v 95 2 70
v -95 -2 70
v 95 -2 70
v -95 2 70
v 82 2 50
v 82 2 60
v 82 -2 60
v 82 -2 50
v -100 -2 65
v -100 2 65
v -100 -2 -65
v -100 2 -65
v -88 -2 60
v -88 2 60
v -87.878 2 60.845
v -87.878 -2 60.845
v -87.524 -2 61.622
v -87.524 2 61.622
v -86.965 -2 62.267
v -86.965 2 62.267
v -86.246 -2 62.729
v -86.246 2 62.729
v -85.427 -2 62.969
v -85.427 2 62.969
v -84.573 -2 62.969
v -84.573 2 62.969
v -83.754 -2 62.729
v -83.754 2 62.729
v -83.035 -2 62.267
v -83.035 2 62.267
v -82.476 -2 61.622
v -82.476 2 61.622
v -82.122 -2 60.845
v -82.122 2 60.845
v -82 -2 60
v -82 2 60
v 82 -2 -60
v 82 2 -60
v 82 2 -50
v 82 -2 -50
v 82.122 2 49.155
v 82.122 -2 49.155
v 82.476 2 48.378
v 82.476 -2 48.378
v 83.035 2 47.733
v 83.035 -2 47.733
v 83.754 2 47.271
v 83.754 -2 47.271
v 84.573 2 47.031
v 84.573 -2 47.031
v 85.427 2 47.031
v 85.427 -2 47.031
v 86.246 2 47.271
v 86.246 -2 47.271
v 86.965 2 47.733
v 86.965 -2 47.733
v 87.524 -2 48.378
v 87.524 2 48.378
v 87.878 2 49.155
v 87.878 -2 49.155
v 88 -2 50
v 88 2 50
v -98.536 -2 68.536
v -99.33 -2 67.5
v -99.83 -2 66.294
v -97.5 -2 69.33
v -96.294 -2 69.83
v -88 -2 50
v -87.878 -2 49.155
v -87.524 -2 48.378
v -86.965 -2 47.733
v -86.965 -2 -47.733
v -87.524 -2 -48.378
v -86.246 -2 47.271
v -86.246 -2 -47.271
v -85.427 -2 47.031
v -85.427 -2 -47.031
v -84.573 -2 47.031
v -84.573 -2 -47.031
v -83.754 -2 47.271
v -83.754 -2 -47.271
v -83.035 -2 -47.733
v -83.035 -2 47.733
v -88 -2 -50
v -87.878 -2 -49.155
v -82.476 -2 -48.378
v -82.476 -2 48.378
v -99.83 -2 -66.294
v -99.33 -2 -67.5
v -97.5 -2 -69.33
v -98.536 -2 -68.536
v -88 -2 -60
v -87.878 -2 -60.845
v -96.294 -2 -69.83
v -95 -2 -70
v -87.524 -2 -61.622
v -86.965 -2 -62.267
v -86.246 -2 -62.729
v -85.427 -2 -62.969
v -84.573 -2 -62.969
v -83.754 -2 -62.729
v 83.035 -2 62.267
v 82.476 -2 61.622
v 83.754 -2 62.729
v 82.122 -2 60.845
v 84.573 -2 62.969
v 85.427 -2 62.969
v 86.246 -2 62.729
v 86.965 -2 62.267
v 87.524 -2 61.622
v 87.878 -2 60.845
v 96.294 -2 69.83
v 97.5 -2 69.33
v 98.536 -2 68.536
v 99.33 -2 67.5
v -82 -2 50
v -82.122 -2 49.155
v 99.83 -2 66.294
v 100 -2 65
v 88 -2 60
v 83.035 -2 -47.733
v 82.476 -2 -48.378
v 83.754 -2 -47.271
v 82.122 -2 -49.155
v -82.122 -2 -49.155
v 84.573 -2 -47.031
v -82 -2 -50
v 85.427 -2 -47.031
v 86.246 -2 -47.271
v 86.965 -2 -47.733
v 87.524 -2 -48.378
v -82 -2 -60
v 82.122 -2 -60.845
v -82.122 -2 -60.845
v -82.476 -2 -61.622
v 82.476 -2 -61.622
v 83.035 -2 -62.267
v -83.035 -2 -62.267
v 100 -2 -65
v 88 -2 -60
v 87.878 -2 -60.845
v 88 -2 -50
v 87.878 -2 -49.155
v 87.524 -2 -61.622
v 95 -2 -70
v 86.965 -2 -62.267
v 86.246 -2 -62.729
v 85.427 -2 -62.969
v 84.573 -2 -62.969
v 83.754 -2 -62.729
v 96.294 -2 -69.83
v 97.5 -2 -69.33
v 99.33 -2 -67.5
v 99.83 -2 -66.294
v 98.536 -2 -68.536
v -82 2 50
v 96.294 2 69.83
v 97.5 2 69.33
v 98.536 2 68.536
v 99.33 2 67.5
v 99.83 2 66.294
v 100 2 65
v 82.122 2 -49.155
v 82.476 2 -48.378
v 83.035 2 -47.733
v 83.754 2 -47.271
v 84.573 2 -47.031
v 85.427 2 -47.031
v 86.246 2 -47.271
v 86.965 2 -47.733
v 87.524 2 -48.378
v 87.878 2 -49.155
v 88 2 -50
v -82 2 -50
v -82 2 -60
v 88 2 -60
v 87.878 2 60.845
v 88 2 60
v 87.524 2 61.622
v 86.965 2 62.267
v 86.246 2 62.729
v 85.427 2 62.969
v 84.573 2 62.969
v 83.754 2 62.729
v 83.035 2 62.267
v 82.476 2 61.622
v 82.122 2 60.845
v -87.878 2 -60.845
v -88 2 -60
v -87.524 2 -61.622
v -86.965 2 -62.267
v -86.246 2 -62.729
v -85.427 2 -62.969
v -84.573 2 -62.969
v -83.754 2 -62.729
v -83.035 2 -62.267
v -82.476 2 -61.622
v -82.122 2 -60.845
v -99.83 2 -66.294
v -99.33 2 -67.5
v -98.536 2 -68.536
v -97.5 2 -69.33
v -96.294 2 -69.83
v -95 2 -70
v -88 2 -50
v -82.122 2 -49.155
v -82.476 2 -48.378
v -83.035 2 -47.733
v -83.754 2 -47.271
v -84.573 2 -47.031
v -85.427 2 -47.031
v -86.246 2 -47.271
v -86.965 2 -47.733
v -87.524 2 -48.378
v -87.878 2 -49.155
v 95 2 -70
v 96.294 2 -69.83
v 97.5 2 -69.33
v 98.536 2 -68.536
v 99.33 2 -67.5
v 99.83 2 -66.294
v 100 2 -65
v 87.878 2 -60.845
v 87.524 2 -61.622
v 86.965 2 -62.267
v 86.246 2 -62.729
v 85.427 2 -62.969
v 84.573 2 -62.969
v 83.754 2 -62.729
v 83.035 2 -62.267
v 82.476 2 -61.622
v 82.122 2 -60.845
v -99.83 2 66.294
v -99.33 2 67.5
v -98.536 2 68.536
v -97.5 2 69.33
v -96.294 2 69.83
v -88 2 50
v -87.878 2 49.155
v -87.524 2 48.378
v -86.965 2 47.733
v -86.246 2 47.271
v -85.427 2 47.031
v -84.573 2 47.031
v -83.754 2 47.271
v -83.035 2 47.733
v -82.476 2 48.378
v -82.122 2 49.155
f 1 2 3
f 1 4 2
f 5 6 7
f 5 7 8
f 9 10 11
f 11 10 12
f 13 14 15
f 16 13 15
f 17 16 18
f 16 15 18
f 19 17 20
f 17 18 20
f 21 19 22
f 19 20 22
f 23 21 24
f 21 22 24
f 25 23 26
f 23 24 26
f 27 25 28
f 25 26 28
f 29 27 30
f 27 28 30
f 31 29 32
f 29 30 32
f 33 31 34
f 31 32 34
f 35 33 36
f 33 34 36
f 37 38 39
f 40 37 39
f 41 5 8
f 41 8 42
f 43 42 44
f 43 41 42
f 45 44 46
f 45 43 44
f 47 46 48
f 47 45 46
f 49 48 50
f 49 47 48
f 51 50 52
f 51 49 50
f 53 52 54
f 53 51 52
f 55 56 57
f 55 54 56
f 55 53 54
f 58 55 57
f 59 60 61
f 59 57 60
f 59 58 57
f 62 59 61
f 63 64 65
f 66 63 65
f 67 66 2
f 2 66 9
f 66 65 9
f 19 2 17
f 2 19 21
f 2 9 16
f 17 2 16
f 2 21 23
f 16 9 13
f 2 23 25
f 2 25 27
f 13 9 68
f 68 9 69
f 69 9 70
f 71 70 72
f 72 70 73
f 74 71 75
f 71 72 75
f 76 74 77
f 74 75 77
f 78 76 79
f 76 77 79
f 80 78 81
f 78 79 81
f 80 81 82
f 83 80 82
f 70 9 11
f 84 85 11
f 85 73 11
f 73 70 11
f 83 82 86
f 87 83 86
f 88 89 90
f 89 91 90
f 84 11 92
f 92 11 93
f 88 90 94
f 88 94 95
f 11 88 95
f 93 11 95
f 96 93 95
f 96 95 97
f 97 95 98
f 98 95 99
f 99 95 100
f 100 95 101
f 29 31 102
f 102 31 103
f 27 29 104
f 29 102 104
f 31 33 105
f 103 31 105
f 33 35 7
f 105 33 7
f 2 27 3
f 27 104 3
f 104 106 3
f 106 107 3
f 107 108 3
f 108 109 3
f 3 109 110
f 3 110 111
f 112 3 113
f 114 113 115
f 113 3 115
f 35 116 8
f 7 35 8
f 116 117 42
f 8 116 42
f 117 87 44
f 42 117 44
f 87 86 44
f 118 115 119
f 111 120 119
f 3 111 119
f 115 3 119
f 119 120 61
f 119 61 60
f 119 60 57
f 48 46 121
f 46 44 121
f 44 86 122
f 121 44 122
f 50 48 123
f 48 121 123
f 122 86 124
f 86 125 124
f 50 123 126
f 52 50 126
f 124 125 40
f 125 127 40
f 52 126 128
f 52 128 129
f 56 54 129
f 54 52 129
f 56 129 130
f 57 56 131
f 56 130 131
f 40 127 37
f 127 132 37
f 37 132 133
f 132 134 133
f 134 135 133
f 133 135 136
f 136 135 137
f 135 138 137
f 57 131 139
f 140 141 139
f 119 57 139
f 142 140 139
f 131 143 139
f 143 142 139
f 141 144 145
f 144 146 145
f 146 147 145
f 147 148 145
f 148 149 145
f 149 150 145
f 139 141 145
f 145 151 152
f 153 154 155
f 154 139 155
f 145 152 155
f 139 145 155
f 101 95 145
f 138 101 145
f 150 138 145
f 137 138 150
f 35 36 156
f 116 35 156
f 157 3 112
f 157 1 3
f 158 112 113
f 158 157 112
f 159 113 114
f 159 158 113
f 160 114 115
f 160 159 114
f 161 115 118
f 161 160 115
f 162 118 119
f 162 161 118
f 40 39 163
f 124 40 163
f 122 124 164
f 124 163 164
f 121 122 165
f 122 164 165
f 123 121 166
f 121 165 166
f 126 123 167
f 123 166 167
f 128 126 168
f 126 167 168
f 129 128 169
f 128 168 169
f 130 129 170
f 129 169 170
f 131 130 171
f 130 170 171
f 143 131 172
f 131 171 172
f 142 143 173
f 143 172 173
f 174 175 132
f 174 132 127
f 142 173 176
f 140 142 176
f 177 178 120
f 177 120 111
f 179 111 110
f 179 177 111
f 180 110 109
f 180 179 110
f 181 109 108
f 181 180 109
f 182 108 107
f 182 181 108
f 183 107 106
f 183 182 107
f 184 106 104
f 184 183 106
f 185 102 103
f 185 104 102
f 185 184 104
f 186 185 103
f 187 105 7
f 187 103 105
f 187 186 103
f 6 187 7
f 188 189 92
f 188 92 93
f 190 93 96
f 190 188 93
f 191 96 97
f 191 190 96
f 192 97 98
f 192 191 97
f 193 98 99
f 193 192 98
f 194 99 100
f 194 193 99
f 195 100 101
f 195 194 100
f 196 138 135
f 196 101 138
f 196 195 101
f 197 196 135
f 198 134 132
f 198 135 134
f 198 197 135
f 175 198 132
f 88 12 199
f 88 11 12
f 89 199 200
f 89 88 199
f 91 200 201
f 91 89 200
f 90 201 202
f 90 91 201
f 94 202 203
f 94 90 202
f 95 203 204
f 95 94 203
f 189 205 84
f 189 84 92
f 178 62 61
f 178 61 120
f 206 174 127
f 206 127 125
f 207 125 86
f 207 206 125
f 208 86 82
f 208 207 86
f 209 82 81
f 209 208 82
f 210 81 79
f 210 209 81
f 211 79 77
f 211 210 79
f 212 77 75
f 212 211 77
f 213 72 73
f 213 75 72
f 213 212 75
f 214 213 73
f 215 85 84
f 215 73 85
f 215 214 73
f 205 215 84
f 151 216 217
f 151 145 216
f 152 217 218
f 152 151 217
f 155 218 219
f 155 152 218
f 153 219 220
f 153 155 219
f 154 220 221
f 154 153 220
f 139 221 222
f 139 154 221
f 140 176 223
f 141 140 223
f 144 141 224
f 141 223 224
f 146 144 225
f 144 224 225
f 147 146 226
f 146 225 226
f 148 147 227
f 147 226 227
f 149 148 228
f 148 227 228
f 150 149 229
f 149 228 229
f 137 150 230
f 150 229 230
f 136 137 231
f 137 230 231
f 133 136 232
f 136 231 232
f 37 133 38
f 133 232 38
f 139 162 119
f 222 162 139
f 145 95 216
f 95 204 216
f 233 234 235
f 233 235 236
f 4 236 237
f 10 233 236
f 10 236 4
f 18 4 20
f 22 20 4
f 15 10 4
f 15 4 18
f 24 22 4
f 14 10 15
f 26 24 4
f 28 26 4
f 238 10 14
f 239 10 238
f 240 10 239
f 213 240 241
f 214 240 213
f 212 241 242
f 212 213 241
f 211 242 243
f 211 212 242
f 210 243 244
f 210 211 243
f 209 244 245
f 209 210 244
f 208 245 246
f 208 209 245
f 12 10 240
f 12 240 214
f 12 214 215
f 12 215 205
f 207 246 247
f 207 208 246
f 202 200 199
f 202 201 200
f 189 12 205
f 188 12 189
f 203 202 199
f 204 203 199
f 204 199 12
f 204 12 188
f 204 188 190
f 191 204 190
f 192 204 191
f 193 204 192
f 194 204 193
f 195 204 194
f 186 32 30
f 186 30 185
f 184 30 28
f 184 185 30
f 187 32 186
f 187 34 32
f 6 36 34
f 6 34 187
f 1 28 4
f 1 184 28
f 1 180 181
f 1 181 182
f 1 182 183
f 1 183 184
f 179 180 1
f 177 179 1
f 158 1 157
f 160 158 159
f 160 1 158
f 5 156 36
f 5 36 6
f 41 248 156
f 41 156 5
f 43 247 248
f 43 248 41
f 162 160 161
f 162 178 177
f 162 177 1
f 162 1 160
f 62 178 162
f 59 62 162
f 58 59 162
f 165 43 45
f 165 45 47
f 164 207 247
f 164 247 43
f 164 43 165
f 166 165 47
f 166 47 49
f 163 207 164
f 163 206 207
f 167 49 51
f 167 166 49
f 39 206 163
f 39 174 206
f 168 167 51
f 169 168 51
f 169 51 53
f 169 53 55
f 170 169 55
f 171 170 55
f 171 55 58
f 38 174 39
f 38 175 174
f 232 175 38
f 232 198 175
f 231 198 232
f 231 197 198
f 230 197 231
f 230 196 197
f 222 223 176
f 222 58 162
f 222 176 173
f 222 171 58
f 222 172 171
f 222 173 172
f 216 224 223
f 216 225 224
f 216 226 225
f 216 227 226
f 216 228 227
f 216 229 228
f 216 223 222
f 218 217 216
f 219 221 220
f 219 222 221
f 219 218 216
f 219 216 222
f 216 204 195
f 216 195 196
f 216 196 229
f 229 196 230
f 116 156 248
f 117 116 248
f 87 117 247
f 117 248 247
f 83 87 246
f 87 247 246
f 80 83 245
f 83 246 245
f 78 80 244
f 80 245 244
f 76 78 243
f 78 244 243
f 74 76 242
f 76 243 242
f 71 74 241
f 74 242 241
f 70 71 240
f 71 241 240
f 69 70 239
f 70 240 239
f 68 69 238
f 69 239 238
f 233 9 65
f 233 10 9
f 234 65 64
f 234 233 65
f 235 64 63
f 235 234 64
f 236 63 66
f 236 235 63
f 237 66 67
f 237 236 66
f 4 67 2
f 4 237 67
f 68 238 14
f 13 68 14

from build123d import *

# Parameters (mm, degrees)
SKETCH1_W           = 200
SKETCH1_H           = 140
BOSS_EXTRUDE1_DEPTH = 2
CUT_EXTRUDE1_DEPTH  = 123.131077126
FILLET1_R           = 5


with BuildPart() as part:
    # Sketch1 → Boss-Extrude1 (new, symmetric)
    with BuildSketch(Plane(origin=(0, 0, 0), x_dir=(1, 0, 0), z_dir=(0, 1, 0))):
        Rectangle(SKETCH1_W, SKETCH1_H)
    extrude(amount=BOSS_EXTRUDE1_DEPTH, both=True)

    # Sketch2 → Cut-Extrude1 (cut, through all)
    with BuildSketch(Plane(origin=(0, 2, 0), x_dir=(1, 0, 0), z_dir=(0, 1, 0))):
        with BuildLine():
            Line((-82, 60), (-82, 50))
            ThreePointArc((-82, 50), (-85, 47), (-88, 50))
            Line((-88, 50), (-88, 60))
            ThreePointArc((-88, 60), (-85, 63), (-82, 60))
        make_face()
        with BuildLine():
            Line((82, 60), (82, 50))
            ThreePointArc((82, 50), (85, 47), (88, 50))
            Line((88, 50), (88, 60))
            ThreePointArc((88, 60), (85, 63), (82, 60))
        make_face()
        with BuildLine():
            Line((82, -60), (82, -50))
            ThreePointArc((82, -50), (85, -47), (88, -50))
            Line((88, -50), (88, -60))
            ThreePointArc((88, -60), (85, -63), (82, -60))
        make_face()
        with BuildLine():
            Line((-82, -60), (-82, -50))
            ThreePointArc((-82, -50), (-85, -47), (-88, -50))
            Line((-88, -50), (-88, -60))
            ThreePointArc((-88, -60), (-85, -63), (-82, -60))
        make_face()
    extrude(amount=-CUT_EXTRUDE1_DEPTH, mode=Mode.SUBTRACT)

    # Fillet1
    fillet1_edges = [part.edges().sort_by_distance(p)[0] for p in [
        (100, 0, 70),
        (-100, 0, 70),
        (-100, 0, -70),
        (100, 0, -70),
    ]]
    fillet(fillet1_edges, radius=FILLET1_R)


solid = part.part
